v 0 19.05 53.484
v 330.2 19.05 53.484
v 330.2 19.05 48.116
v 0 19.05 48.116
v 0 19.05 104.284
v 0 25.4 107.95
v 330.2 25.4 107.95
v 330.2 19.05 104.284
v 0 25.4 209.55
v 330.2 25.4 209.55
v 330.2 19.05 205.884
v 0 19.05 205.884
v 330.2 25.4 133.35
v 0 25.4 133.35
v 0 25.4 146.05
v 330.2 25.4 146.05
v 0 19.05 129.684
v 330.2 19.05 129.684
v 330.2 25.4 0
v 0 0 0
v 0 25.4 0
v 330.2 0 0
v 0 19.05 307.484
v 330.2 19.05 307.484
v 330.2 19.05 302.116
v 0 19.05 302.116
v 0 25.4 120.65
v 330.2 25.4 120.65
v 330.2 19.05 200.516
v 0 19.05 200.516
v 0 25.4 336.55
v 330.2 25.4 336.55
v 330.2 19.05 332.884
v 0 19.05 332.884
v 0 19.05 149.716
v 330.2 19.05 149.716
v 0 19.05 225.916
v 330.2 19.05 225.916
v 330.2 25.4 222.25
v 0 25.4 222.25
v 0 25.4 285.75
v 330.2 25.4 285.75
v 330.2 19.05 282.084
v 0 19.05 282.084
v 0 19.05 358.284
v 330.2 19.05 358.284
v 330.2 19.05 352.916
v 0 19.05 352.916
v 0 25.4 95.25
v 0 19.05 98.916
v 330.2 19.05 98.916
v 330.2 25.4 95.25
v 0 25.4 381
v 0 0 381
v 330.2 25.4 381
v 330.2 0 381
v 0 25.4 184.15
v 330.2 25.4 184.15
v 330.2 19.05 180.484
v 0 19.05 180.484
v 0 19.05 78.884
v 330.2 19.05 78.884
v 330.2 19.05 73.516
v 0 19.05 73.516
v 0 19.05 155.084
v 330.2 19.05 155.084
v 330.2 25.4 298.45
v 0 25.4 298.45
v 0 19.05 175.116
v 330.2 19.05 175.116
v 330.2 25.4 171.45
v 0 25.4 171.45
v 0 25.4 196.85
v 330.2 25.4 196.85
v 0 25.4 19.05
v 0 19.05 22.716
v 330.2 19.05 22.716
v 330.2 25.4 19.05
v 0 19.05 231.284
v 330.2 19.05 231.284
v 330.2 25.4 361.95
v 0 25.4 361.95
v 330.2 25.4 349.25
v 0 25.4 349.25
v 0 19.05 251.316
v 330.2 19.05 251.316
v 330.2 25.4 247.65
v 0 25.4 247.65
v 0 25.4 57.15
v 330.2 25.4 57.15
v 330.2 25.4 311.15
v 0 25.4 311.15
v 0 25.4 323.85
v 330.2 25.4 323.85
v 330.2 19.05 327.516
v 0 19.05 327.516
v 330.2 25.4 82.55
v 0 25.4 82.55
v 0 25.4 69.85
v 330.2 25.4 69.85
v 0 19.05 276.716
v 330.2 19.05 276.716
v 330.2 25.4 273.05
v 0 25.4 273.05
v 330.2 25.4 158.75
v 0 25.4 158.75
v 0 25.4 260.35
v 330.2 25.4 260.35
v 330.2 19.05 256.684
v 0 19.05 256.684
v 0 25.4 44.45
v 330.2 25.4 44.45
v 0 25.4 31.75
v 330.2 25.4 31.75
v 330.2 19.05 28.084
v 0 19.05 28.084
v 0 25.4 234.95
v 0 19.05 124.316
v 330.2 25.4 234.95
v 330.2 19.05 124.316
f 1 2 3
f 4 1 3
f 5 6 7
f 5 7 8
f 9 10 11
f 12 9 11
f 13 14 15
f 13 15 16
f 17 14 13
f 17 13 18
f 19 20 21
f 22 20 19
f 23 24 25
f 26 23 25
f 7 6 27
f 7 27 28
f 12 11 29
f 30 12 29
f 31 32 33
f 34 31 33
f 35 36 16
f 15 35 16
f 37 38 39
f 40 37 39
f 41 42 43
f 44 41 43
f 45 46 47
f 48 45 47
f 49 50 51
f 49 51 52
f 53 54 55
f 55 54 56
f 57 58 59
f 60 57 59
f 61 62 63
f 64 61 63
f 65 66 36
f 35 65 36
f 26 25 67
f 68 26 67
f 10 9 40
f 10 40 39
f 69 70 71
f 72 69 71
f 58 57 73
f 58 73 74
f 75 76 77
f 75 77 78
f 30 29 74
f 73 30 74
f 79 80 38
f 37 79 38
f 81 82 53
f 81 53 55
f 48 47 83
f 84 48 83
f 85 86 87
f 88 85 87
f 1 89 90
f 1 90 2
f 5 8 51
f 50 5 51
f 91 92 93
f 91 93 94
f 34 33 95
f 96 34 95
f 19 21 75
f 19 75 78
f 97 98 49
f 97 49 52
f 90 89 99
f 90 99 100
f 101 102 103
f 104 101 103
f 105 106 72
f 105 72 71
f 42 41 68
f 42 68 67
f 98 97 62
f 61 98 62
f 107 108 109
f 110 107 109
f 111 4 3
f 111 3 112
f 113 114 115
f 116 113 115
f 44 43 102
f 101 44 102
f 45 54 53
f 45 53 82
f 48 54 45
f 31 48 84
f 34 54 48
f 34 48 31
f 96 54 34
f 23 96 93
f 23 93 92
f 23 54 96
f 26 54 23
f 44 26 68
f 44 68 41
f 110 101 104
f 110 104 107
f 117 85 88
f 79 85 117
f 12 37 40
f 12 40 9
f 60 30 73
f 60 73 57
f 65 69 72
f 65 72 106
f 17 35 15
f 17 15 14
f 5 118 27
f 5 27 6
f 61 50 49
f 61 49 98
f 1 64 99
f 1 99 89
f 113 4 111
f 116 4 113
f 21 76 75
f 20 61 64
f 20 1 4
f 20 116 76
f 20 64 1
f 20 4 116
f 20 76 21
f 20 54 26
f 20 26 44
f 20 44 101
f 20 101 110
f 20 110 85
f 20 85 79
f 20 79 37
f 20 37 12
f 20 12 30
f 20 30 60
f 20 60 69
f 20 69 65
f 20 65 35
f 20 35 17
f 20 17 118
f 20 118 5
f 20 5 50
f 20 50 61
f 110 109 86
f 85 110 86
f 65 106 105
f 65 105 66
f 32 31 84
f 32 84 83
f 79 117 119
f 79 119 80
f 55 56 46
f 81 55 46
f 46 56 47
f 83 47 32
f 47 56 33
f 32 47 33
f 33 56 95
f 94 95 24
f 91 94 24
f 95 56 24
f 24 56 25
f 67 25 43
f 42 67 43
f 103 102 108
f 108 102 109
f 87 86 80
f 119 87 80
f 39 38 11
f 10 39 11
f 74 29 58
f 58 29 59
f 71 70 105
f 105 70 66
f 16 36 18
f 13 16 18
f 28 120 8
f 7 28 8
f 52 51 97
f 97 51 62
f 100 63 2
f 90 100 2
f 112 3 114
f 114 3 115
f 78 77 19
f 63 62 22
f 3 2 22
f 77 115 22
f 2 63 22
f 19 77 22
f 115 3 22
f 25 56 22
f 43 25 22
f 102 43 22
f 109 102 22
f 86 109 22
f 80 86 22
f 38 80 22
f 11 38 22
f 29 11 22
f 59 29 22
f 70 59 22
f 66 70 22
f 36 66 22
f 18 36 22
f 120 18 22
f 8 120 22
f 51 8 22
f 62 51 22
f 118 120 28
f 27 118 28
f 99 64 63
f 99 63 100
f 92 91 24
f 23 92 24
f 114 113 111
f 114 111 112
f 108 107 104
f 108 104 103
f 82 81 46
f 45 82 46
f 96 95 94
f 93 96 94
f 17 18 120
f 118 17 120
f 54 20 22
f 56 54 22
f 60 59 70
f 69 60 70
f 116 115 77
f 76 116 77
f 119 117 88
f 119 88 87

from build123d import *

# Parameters (mm, degrees)
SKETCH2_W           = 330.2
SKETCH2_H           = 381
BOSS_EXTRUDE1_DEPTH = 25.4
CUT_EXTRUDE1_DEPTH  = 505.815015625


with BuildPart() as part:
    # Sketch2 → Boss-Extrude1 (new body)
    with BuildSketch(Plane(origin=(0, 0, 0), x_dir=(1, 0, 0), z_dir=(0, 1, 0))):
        with Locations((165.1, -190.5)):
            Rectangle(SKETCH2_W, SKETCH2_H)
    extrude(amount=BOSS_EXTRUDE1_DEPTH)

    # Sketch3 → Cut-Extrude1 (cut, through all)
    with BuildSketch(Plane(origin=(330.2, 0, 0), x_dir=(0, 0, -1), z_dir=(1, 0, 0))):
        Polygon((-361.95, 25.4), (-358.283825791, 19.05), (-352.916174209, 19.05), (-349.25, 25.4), align=None)
        Polygon((-323.85, 25.4), (-336.55, 25.4), (-332.883825791, 19.05), (-327.516174209, 19.05), align=None)
        Polygon((-298.45, 25.4), (-311.15, 25.4), (-307.483825791, 19.05), (-302.116174209, 19.05), align=None)
        Polygon((-273.05, 25.4), (-285.75, 25.4), (-282.083825791, 19.05), (-276.716174209, 19.05), align=None)
        Polygon((-247.65, 25.4), (-260.35, 25.4), (-256.683825791, 19.05), (-251.316174209, 19.05), align=None)
        Polygon((-222.25, 25.4), (-234.95, 25.4), (-231.283825791, 19.05), (-225.916174209, 19.05), align=None)
        Polygon((-196.85, 25.4), (-209.55, 25.4), (-205.883825791, 19.05), (-200.516174209, 19.05), align=None)
        Polygon((-171.45, 25.4), (-184.15, 25.4), (-180.483825791, 19.05), (-175.116174209, 19.05), align=None)
        Polygon((-146.05, 25.4), (-158.75, 25.4), (-155.083825791, 19.05), (-149.716174209, 19.05), align=None)
        Polygon((-120.65, 25.4), (-133.35, 25.4), (-129.683825791, 19.05), (-124.316174209, 19.05), align=None)
        Polygon((-95.25, 25.4), (-107.95, 25.4), (-104.283825791, 19.05), (-98.916174209, 19.05), align=None)
        Polygon((-69.85, 25.4), (-82.55, 25.4), (-78.883825791, 19.05), (-73.516174209, 19.05), align=None)
        Polygon((-44.45, 25.4), (-57.15, 25.4), (-53.483825791, 19.05), (-48.116174209, 19.05), align=None)
        Polygon((-19.05, 25.4), (-31.75, 25.4), (-28.083825791, 19.05), (-22.716174209, 19.05), align=None)
    extrude(amount=-CUT_EXTRUDE1_DEPTH, mode=Mode.SUBTRACT)


solid = part.part
